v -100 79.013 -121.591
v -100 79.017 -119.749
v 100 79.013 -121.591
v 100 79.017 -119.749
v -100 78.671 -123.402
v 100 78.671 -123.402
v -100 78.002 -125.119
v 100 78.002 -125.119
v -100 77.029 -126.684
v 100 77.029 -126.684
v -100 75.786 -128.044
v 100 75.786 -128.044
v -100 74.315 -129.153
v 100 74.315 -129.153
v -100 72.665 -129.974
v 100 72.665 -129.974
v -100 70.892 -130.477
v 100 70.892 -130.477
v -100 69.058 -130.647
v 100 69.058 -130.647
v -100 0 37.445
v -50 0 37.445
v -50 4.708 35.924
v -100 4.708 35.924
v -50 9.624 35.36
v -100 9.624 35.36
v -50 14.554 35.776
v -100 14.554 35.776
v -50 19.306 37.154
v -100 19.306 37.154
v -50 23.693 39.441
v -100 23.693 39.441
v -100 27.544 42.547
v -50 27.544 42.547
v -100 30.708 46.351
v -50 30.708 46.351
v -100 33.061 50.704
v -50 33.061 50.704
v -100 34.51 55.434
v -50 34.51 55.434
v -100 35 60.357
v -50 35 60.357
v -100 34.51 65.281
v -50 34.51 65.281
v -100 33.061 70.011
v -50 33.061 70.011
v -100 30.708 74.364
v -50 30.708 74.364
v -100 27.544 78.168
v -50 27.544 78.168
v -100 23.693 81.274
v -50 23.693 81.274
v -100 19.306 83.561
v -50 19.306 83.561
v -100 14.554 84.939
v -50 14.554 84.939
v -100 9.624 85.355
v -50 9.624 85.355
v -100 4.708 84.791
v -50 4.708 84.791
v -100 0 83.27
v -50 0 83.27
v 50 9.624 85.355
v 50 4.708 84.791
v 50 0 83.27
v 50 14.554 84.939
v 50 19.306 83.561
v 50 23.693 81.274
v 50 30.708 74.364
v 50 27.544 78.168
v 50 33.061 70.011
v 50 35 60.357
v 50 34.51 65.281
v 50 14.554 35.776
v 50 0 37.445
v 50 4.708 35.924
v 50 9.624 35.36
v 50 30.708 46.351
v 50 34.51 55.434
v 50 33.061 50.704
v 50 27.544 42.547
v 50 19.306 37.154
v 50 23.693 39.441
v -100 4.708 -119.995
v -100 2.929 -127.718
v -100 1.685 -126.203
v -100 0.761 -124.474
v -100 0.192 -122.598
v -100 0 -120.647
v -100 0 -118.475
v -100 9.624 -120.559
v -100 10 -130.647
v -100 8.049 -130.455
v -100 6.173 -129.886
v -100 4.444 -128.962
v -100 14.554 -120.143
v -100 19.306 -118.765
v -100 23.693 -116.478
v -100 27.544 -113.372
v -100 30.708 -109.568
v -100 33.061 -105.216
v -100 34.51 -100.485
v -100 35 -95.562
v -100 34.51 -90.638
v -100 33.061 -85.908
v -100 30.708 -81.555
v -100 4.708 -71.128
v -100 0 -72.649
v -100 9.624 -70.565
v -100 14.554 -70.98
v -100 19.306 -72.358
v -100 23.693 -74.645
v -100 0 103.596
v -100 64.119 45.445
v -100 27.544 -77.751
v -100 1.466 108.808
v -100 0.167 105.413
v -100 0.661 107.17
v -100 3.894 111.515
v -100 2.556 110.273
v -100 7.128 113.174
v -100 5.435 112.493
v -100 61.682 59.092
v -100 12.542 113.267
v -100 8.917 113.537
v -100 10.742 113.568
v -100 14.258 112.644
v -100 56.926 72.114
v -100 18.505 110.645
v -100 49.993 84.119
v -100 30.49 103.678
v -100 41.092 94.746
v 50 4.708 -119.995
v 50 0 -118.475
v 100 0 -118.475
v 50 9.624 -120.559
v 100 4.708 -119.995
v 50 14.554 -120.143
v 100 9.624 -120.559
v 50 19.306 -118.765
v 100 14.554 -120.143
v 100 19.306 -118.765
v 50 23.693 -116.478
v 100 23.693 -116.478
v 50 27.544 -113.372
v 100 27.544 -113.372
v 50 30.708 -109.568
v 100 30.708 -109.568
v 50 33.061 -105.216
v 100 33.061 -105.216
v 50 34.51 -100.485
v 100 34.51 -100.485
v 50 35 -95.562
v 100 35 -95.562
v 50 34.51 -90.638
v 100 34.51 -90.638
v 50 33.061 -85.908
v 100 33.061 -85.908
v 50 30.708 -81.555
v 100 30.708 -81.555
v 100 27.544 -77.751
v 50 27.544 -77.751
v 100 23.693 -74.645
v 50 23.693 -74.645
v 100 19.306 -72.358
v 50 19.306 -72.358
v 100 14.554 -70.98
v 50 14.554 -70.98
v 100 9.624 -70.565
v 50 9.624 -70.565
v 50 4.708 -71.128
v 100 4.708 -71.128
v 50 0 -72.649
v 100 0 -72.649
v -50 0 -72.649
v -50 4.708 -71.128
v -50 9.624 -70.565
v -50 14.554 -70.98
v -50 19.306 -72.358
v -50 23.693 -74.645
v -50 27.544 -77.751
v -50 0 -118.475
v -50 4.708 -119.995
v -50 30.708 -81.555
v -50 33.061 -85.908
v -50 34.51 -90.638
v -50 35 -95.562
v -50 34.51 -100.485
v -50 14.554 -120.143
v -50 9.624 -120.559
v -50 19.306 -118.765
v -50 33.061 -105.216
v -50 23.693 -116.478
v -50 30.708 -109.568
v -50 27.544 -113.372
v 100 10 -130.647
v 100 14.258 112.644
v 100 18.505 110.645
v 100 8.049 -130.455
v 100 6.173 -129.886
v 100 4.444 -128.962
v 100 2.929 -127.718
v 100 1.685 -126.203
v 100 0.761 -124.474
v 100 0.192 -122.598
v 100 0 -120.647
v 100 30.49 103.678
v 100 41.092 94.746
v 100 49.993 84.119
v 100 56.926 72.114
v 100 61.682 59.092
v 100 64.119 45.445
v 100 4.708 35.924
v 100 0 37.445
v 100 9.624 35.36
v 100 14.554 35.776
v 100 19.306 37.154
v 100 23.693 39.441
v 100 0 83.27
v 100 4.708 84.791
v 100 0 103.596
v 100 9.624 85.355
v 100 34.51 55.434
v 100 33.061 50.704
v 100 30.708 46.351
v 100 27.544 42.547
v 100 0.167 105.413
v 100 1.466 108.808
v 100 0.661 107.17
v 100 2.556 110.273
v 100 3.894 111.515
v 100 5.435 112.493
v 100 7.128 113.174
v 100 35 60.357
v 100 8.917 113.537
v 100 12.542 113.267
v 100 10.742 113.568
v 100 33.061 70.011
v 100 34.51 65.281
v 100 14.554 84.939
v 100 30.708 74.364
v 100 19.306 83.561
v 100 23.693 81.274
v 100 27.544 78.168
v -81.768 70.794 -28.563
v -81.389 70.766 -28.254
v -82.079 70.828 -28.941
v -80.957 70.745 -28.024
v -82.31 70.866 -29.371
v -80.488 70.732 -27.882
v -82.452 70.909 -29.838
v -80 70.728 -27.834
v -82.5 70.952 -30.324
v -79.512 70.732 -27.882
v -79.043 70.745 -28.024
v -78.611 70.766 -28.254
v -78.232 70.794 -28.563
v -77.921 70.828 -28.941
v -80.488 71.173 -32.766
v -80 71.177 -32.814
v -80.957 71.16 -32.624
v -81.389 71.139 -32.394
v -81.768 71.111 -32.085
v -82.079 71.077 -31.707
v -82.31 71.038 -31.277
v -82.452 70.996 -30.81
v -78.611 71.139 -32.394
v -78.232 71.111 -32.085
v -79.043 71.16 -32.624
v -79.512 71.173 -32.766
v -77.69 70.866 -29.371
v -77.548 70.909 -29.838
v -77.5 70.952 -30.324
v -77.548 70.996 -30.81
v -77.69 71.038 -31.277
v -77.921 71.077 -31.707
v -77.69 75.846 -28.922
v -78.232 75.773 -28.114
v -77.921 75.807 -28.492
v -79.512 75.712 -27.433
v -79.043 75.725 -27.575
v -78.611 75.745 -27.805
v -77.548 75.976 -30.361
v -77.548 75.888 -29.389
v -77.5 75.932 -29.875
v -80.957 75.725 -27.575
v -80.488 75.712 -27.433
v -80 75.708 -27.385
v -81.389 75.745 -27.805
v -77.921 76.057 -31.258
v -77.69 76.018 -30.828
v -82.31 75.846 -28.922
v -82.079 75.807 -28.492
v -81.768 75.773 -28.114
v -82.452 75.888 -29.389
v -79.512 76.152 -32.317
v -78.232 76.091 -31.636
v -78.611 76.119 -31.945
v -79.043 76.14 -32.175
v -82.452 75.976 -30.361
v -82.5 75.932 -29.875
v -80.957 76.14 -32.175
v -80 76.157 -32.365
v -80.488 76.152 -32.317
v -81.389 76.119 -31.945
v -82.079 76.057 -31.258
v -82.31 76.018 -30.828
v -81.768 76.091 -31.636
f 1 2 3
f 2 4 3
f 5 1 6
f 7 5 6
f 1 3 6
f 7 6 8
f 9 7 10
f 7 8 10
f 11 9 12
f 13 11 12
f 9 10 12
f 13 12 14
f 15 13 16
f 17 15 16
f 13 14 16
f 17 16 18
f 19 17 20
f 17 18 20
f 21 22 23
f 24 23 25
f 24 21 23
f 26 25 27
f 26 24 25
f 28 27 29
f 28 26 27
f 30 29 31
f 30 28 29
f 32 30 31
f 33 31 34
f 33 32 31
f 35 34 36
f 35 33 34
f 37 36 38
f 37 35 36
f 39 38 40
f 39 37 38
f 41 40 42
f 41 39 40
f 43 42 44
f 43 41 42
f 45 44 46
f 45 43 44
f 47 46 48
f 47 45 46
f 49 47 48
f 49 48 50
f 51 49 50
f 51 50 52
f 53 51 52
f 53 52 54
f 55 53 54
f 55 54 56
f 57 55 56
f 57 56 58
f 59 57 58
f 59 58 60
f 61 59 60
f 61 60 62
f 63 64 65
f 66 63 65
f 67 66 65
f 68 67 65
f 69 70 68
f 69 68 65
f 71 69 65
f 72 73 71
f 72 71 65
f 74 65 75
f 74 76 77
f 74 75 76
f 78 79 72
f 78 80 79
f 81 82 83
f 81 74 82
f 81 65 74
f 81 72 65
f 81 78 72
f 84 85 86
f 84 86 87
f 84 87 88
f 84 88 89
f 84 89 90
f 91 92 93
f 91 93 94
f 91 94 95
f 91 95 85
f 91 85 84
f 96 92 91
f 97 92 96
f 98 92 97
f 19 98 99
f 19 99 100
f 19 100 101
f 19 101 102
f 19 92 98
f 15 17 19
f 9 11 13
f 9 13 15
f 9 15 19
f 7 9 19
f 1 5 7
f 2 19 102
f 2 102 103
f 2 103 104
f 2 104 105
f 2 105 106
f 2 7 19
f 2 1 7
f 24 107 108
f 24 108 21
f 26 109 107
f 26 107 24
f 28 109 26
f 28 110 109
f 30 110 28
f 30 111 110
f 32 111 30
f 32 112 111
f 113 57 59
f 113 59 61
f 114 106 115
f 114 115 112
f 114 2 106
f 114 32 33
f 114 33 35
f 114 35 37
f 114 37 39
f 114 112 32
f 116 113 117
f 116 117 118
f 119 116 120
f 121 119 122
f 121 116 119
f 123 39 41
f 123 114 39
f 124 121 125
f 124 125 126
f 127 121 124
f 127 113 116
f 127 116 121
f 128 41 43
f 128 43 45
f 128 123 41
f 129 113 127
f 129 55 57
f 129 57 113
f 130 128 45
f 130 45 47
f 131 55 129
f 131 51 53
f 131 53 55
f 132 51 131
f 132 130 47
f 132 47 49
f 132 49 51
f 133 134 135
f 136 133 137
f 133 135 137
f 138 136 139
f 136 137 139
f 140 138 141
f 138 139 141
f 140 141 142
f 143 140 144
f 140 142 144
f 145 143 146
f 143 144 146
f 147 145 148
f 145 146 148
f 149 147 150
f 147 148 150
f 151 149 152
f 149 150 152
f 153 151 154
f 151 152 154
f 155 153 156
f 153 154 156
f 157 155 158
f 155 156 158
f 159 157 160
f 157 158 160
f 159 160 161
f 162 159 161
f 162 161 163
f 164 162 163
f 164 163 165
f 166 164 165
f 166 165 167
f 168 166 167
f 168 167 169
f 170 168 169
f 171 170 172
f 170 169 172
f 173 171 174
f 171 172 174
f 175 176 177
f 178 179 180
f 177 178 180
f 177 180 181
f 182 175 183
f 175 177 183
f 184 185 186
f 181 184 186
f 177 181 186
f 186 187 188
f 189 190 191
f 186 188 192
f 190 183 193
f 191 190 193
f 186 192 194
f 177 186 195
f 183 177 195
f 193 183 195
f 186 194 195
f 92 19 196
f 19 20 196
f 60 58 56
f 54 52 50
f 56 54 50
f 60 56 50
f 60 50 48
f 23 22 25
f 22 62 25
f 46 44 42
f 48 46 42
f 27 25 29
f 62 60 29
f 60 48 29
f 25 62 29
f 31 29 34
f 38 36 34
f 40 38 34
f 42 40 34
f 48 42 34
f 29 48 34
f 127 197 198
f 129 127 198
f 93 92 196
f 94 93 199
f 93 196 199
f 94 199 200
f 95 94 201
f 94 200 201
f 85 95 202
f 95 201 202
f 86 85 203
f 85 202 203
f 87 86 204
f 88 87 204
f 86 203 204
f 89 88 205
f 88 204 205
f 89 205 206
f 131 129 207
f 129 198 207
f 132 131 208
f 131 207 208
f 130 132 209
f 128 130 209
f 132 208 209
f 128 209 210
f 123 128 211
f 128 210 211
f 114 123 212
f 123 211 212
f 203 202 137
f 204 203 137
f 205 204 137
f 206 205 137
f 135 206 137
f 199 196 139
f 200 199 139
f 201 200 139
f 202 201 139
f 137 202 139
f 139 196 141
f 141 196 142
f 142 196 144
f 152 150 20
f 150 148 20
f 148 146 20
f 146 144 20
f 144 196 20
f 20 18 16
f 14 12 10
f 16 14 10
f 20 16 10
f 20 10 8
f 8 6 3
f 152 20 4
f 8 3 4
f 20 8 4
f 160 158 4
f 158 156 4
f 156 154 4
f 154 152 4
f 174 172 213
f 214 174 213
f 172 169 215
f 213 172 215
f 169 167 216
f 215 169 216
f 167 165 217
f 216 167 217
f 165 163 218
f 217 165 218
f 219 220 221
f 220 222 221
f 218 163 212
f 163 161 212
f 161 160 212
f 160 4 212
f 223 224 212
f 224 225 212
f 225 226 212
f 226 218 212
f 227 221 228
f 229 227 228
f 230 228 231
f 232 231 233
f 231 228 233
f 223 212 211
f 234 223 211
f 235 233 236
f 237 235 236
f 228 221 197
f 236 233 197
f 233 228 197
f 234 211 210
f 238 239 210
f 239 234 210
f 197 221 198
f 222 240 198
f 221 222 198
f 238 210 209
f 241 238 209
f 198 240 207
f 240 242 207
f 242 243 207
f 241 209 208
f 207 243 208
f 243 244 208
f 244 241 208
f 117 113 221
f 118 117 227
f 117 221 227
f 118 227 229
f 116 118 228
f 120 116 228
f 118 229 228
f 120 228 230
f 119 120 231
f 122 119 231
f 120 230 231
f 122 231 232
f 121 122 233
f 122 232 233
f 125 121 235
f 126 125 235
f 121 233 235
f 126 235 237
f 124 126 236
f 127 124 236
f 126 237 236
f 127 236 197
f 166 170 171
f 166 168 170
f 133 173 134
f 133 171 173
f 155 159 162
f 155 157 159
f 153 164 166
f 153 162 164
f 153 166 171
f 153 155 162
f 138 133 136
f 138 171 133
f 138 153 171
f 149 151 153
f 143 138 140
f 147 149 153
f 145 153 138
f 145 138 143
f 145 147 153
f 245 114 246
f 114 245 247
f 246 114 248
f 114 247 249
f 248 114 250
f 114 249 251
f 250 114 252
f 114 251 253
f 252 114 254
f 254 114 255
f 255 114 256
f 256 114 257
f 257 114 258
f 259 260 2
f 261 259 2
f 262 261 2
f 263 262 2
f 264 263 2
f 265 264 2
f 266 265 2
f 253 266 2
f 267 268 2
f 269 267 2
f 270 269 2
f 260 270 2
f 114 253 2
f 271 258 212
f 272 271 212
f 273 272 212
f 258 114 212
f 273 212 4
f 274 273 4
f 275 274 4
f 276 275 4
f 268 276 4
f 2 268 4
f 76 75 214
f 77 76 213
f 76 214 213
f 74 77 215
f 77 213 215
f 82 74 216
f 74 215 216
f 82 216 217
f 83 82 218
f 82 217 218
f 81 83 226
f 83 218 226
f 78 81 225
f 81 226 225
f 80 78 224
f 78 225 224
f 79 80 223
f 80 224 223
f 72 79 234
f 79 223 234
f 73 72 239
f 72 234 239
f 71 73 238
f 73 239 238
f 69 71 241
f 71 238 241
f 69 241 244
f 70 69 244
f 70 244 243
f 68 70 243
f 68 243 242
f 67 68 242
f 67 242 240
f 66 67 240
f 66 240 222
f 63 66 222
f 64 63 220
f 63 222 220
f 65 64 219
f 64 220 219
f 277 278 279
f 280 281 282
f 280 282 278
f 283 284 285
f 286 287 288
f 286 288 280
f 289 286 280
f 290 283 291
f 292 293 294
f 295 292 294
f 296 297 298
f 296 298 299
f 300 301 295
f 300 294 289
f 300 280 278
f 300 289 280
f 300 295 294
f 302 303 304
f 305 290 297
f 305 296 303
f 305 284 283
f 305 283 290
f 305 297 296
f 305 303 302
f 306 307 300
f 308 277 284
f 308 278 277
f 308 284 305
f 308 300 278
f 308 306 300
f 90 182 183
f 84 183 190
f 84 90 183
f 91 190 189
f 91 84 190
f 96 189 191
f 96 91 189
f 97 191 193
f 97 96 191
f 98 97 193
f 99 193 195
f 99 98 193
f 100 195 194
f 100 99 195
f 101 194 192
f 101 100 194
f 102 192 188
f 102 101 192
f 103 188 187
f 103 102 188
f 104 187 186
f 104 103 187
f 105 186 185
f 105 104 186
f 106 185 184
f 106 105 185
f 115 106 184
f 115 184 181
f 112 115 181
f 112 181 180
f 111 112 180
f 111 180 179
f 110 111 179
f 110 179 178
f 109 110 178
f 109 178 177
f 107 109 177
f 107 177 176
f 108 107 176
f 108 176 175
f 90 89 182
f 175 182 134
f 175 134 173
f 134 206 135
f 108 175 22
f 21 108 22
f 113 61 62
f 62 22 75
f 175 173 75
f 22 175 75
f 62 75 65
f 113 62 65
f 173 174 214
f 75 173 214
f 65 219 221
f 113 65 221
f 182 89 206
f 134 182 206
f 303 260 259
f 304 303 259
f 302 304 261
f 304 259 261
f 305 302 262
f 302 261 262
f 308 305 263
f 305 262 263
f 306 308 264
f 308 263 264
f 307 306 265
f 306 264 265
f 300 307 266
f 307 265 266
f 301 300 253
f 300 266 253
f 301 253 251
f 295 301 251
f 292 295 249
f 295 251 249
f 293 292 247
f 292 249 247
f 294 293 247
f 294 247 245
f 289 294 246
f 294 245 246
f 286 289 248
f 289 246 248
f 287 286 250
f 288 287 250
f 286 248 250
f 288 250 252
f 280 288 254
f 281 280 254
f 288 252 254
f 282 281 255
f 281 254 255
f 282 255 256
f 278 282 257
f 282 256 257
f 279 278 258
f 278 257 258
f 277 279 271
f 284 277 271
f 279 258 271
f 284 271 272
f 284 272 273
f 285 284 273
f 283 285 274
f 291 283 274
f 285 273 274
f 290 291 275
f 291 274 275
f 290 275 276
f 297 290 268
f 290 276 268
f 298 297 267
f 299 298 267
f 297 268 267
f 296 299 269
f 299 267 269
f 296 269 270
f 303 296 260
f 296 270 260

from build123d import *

# Parameters (mm, degrees)
BOSS_EXTRUDE1_DEPTH = 100
SKETCH3_R           = 25
CUT_EXTRUDE1_DEPTH  = 50
SKETCH4_R           = 2.5
BOSS_EXTRUDE2_DEPTH = 5


with BuildPart() as part:
    # Sketch2 → Boss-Extrude1 (new, symmetric)
    with BuildSketch(Plane(origin=(0, 0, 0), x_dir=(0, 0, -1), z_dir=(1, 0, 0))):
        with BuildLine():
            Line((-112.643906845, 14.257821235), (-110.645286598, 18.505070953))
            ThreePointArc((-110.645286598, 18.505070953), (-84.118524888, 49.993435328), (-45.444881226, 64.119137564))
            Line((-45.444881226, 64.119137564), (119.748610721, 79.017143226))
            ThreePointArc((119.748610721, 79.017143226), (127.392850703, 76.439367824), (130.646817248, 69.057563665))
            Line((130.646817248, 69.057563665), (130.646817248, 10))
            ThreePointArc((130.646817248, 10), (127.71788506, 2.928932188), (120.646817248, 0))
            Line((120.646817248, 0), (-103.595649647, 0))
            ThreePointArc((-103.595649647, 0), (-112.038937287, 4.641745263), (-112.643906845, 14.257821235))
        make_face()
    extrude(amount=BOSS_EXTRUDE1_DEPTH, both=True)

    # Sketch3 → Cut-Extrude1 (cut)
    with BuildSketch(Plane(origin=(100, 0, 0), x_dir=(0, 0, -1), z_dir=(1, 0, 0))):
        with Locations((-60.35749377, 10)):
            Circle(SKETCH3_R)
        with Locations((95.561704497, 10)):
            Circle(SKETCH3_R)
    cut_extrude1 = extrude(amount=-CUT_EXTRUDE1_DEPTH, mode=Mode.SUBTRACT)

    # Mirror1: Cut-Extrude1 across plane
    add(cut_extrude1.mirror(Plane(origin=(0, 0, 0), x_dir=(0, 0, 1), z_dir=(1, 0, 0))), mode=Mode.SUBTRACT)

    # Sketch4 → Boss-Extrude2 (add)
    with BuildSketch(Plane(origin=(0, 67.667230134, 6.102581681), x_dir=(1, 0, 0), z_dir=(0, 0.9959579561140941, 0.0898206527088083))):
        with Locations(Location((-80, 36.574402855, 0), (0, 0, 90))):
            Circle(SKETCH4_R)
    extrude(amount=BOSS_EXTRUDE2_DEPTH)


solid = part.part
